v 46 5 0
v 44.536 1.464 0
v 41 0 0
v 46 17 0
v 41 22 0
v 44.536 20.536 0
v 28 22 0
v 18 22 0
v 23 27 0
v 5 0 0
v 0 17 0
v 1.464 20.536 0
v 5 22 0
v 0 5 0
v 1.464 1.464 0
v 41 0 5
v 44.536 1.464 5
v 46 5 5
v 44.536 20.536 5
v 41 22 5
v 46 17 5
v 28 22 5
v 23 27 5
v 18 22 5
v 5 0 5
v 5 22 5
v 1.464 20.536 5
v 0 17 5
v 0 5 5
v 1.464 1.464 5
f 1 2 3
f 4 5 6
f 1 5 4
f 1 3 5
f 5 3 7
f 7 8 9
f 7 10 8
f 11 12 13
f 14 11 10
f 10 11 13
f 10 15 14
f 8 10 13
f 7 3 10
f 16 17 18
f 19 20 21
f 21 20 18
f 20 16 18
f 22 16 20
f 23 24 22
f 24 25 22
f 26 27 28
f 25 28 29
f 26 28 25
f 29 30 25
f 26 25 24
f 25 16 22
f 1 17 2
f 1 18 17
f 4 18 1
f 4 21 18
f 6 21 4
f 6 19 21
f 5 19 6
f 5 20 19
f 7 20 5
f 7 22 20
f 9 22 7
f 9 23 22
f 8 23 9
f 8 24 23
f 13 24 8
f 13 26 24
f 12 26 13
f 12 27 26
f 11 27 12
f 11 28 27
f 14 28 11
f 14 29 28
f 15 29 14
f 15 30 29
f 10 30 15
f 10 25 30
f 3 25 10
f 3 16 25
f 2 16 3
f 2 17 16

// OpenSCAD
$fn = 32;

// ----------------------------------------------------------------------
// Ratchet pawl: 46 x 22 mm body, beak 5 mm сверху
// ----------------------------------------------------------------------

// --- parameters (mm) ---
profile_height = 5;       // extrusion height
profile_points = 15;      // points of the closed outline

profile = [[0, 5], [1.464, 1.464], [5, 0], [41, 0], [44.536, 1.464], [46, 5], [46, 17], [44.536, 20.536], [41, 22], [28, 22], [23, 27], [18, 22], [5, 22], [1.464, 20.536], [0, 17]];  // single closed polygon, 15 points, counter clockwise

// --- the one profile operation ---
linear_extrude(height = profile_height) polygon(points = profile);
